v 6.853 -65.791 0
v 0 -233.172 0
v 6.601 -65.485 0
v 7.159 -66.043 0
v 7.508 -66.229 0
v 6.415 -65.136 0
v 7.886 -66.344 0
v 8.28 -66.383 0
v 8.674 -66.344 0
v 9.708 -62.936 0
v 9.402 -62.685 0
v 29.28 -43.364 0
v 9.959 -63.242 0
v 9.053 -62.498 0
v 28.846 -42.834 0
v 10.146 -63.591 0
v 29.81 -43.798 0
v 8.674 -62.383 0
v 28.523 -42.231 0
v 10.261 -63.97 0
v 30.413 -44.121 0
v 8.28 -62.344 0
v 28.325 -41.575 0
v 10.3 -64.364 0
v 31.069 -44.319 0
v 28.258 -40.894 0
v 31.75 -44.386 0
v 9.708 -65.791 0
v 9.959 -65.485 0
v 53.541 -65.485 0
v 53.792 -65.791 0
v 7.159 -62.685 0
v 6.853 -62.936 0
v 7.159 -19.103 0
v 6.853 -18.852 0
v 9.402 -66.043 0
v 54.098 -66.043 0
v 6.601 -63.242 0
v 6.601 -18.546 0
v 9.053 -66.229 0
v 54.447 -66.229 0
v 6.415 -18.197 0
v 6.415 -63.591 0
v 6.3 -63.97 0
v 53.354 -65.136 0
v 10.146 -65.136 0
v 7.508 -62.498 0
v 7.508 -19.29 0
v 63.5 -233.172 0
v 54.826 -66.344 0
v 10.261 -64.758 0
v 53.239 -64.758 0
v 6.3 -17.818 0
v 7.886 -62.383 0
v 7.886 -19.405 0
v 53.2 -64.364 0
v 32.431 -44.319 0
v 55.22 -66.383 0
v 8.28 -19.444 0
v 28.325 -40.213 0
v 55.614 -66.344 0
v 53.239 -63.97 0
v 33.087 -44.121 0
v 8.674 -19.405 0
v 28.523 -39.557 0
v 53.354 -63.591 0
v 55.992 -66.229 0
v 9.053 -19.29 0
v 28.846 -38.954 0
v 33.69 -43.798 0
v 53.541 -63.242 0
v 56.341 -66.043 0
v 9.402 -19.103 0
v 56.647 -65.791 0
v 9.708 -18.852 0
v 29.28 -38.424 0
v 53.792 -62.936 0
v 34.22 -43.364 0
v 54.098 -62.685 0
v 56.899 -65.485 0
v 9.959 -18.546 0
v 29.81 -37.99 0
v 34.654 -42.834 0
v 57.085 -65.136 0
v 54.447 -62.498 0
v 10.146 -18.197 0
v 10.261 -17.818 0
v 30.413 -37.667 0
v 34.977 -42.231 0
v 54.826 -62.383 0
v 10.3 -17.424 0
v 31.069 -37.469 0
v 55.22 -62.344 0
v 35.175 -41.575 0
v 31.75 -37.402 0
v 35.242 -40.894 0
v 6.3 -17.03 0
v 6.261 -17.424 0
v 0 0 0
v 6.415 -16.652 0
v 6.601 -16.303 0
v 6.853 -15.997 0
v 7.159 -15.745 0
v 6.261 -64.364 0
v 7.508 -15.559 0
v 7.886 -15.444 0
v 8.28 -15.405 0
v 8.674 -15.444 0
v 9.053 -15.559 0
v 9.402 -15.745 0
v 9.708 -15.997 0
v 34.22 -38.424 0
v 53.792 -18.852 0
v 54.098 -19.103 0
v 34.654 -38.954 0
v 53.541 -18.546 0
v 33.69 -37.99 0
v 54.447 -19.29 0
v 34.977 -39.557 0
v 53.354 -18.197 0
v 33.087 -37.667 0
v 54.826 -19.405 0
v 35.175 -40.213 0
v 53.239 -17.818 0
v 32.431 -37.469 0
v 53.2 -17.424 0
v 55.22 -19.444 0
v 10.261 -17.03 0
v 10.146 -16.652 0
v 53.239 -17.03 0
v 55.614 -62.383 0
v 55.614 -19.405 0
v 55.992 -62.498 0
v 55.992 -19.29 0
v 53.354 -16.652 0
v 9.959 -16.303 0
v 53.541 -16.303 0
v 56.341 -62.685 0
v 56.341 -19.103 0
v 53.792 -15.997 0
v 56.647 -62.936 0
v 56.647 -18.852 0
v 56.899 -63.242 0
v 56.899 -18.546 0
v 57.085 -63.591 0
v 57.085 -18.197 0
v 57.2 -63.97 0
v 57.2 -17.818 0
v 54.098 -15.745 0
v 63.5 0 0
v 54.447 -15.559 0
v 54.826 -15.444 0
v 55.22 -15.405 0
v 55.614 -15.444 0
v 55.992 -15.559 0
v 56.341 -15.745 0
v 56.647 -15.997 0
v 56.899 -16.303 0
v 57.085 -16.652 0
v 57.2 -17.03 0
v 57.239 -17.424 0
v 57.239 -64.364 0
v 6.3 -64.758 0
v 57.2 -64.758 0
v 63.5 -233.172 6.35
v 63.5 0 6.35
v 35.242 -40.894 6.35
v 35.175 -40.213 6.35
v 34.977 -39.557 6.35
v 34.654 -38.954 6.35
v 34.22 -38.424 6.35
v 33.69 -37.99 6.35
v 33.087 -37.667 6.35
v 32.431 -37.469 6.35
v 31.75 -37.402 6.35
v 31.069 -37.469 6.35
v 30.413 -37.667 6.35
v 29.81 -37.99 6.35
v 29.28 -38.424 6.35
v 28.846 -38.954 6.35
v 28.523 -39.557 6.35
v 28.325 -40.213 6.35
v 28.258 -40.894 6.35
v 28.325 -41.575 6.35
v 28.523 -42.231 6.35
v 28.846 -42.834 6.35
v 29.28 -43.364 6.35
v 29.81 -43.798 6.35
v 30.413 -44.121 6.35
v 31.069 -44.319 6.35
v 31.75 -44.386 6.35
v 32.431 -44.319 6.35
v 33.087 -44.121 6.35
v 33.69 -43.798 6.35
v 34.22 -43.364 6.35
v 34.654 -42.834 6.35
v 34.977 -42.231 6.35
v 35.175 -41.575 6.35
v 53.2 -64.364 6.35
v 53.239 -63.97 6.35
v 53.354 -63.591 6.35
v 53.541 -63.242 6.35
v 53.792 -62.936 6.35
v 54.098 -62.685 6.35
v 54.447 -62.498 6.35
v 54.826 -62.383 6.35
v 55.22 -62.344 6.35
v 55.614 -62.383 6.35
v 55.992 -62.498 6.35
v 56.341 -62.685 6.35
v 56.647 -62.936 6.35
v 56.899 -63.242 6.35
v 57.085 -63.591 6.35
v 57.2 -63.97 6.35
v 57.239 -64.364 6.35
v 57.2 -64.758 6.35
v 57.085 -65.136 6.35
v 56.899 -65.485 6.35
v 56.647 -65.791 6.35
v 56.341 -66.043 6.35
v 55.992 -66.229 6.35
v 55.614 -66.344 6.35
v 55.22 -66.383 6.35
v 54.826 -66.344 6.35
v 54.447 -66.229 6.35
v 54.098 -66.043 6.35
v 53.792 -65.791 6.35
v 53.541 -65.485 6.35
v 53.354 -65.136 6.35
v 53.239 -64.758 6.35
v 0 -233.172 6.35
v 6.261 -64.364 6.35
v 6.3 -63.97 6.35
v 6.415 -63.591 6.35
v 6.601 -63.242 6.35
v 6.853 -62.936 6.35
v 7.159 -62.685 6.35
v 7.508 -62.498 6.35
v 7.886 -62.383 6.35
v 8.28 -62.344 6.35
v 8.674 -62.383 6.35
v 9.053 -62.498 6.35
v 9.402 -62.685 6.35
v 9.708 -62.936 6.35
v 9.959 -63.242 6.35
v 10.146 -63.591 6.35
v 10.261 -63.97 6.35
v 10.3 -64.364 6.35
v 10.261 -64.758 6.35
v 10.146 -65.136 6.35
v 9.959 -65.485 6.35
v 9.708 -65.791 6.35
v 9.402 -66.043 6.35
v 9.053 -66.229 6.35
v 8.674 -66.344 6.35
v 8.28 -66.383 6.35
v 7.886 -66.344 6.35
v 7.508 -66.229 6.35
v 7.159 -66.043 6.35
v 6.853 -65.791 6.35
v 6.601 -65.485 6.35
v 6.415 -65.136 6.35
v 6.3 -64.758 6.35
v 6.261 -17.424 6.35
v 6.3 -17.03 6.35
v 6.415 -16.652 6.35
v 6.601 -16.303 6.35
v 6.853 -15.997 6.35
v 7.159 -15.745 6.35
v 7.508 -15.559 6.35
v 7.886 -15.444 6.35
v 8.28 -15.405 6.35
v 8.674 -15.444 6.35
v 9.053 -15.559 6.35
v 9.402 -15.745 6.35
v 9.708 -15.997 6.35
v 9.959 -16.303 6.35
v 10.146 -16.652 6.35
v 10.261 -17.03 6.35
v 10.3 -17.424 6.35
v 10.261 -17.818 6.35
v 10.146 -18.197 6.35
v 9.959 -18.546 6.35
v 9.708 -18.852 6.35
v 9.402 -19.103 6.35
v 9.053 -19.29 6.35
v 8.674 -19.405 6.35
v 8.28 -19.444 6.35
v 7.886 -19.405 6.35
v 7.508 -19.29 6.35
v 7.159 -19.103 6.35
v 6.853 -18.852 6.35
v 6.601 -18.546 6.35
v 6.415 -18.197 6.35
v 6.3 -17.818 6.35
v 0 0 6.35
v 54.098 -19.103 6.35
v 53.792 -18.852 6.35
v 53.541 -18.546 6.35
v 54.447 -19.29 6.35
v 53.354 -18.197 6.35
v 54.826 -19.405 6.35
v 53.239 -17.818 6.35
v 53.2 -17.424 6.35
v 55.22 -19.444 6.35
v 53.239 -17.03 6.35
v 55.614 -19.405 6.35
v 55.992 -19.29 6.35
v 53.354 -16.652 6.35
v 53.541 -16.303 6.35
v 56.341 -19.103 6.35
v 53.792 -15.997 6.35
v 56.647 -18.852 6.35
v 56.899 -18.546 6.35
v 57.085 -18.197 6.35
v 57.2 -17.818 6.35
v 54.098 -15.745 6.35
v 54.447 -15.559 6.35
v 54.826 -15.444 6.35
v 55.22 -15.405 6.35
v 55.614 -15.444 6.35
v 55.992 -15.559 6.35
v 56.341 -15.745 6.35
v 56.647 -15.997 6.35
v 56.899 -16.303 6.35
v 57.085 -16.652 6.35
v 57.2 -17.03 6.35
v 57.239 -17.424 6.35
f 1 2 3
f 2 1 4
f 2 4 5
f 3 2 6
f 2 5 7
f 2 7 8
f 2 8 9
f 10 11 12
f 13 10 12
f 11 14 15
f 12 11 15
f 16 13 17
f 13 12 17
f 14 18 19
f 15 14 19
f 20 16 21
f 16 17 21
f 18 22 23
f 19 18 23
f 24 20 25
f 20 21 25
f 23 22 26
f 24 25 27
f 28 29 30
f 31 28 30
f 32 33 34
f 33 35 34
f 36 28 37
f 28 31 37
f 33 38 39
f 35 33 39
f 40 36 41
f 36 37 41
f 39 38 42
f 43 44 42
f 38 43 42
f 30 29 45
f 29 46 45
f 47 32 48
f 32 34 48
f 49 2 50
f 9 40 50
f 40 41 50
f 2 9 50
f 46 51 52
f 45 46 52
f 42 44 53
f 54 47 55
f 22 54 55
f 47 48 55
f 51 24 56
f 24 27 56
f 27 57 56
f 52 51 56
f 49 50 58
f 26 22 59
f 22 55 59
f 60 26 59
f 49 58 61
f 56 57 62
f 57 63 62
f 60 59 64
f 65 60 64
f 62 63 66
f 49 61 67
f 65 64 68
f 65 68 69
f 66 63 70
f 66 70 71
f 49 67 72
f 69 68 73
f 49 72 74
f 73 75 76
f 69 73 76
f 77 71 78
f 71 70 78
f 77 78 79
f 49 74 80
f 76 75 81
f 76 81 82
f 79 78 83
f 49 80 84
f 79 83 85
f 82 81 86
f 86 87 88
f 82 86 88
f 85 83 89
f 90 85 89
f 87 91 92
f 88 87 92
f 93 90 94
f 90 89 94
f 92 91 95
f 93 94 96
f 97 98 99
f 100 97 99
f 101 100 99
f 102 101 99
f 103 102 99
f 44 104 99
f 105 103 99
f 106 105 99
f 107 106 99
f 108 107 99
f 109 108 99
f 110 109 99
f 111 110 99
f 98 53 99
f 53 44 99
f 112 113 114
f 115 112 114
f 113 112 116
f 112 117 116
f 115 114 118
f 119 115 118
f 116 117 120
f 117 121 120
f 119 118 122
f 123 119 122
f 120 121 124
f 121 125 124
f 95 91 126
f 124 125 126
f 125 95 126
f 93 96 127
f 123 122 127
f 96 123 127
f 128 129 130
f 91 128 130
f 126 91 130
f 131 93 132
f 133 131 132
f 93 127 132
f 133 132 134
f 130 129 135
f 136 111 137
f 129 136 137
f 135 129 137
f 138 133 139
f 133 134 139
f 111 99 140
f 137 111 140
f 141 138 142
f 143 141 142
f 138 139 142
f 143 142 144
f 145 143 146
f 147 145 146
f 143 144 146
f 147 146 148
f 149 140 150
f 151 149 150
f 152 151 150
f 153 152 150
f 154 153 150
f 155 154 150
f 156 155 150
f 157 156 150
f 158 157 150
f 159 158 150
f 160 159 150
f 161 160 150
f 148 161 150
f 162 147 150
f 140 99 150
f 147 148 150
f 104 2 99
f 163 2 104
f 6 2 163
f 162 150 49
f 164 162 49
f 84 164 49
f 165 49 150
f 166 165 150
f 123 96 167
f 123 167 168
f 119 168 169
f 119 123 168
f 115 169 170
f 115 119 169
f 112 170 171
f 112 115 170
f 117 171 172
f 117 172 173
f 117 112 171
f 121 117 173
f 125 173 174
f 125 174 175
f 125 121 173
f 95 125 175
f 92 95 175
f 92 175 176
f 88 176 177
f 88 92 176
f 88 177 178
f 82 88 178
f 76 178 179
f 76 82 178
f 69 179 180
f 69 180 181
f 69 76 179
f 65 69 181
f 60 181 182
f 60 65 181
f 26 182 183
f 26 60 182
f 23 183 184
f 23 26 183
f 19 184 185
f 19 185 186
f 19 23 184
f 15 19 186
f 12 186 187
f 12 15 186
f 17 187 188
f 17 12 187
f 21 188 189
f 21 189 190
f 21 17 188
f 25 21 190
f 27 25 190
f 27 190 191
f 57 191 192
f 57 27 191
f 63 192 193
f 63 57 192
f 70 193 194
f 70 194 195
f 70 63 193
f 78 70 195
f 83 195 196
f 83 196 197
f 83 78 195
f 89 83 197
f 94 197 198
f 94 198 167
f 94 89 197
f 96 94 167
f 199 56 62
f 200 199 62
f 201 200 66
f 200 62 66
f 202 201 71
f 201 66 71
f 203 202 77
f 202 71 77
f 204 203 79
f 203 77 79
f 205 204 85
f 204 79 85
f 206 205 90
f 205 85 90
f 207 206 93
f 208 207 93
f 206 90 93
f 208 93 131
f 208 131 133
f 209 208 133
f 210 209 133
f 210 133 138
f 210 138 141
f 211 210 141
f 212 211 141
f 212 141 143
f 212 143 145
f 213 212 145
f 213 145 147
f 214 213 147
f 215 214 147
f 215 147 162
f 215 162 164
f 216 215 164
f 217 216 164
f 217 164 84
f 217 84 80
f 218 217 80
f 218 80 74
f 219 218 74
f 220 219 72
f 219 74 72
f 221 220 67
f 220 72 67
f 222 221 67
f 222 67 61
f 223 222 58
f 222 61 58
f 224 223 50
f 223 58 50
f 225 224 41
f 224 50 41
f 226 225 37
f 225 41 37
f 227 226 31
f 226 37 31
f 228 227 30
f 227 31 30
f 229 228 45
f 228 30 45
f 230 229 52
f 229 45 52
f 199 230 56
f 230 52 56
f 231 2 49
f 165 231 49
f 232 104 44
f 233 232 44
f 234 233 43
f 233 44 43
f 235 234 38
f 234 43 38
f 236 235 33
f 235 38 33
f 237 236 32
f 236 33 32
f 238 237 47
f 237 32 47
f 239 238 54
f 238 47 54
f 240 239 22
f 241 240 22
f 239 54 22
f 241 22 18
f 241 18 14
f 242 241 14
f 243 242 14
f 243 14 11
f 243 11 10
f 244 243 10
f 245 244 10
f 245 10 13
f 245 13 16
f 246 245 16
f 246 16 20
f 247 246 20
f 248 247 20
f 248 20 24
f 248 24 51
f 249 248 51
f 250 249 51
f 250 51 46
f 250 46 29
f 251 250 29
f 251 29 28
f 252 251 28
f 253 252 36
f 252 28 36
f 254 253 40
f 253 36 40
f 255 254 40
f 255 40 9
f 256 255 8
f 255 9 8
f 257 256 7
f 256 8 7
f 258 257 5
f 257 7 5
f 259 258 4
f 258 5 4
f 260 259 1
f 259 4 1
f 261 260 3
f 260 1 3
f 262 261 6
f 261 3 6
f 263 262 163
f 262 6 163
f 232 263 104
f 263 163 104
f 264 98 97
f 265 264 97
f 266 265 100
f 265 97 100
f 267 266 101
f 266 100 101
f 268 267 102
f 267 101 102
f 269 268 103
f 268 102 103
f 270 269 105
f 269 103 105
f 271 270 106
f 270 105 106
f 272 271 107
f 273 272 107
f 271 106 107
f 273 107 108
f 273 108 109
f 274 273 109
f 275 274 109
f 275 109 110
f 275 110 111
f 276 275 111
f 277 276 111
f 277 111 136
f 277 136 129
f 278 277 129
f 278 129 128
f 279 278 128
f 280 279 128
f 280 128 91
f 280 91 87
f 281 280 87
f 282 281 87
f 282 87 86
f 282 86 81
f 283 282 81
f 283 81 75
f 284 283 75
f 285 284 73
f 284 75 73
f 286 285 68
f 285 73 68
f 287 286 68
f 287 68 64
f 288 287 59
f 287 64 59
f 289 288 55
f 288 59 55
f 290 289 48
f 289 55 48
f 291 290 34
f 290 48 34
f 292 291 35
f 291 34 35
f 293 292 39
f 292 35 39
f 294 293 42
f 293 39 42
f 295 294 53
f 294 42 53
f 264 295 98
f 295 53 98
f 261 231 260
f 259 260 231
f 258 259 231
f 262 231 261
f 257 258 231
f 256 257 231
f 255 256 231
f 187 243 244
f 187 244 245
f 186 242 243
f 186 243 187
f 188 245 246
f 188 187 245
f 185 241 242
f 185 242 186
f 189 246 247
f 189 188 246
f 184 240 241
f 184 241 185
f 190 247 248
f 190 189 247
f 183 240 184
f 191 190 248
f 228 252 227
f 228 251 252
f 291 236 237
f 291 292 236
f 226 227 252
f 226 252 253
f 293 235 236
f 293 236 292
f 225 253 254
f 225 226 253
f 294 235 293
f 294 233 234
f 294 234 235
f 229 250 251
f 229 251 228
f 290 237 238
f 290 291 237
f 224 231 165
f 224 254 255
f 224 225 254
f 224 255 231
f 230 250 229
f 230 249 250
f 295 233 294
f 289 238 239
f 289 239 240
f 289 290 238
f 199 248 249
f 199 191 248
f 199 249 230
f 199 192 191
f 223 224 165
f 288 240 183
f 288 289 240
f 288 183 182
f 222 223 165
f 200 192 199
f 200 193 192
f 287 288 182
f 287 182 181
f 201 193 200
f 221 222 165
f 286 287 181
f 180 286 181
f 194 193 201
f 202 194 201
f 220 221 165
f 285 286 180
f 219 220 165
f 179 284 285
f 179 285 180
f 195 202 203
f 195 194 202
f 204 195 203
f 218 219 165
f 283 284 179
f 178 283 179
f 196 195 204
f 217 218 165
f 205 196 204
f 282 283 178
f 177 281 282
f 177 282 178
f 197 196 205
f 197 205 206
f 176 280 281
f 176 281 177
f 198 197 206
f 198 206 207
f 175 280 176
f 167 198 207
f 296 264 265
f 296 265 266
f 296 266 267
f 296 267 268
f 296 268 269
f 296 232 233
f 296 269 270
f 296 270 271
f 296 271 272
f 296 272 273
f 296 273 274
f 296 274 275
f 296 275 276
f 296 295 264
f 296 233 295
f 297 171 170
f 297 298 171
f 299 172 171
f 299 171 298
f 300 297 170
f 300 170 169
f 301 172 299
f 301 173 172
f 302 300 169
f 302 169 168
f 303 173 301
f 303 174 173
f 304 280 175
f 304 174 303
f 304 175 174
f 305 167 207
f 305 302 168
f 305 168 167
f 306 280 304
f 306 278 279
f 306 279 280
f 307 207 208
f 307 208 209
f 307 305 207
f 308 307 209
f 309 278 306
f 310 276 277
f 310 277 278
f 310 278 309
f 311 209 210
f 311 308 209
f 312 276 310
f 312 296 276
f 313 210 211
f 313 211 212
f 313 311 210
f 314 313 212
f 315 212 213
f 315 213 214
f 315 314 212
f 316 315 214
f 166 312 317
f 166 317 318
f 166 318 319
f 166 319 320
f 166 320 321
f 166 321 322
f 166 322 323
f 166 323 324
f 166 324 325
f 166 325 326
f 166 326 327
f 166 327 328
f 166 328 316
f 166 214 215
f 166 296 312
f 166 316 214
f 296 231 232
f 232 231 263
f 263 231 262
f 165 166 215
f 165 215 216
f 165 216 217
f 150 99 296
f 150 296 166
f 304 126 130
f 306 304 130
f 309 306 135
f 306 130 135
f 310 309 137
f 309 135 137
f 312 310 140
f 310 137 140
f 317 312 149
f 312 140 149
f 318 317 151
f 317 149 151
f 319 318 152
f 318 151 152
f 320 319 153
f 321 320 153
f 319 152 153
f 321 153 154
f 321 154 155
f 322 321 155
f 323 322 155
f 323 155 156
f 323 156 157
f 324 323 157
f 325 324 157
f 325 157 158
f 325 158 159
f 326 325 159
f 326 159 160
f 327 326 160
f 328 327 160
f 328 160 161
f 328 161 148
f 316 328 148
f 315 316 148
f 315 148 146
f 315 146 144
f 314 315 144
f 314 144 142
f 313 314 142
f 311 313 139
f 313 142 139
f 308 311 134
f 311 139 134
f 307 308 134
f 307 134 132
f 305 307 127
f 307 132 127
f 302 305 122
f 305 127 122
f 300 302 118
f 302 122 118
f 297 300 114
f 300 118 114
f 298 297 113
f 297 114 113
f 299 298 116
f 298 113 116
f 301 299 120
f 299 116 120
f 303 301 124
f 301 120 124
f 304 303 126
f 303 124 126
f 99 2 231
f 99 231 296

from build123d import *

# Parameters (mm, degrees)
SKETCH1_W                  = 63.5
SKETCH1_H                  = 233.172
SKETCH1_R                  = 3.4925
BOSS_EXTRUDE1_DEPTH        = 6.35
F_10_32_TAPPED_HOLE1_D     = 4.0386
F_10_32_TAPPED_HOLE1_DEPTH = 6.35


with BuildPart() as part:
    # Sketch1 → Boss-Extrude1 (new body)
    with BuildSketch(Plane.XY):
        with Locations((31.75, -116.586)):
            Rectangle(SKETCH1_W, SKETCH1_H)
        with Locations((31.75, -40.894)):
            Circle(SKETCH1_R, mode=Mode.SUBTRACT)
    extrude(amount=BOSS_EXTRUDE1_DEPTH)

    # #10-32 Tapped Hole1
    with Locations(Plane.XY.offset(6.35)):
        with Locations((8.2804, -17.4244), (55.2196, -17.4244), (55.2196, -64.3636), (8.2804, -64.3636)):
            Hole(F_10_32_TAPPED_HOLE1_D / 2, depth=F_10_32_TAPPED_HOLE1_DEPTH)


solid = part.part
